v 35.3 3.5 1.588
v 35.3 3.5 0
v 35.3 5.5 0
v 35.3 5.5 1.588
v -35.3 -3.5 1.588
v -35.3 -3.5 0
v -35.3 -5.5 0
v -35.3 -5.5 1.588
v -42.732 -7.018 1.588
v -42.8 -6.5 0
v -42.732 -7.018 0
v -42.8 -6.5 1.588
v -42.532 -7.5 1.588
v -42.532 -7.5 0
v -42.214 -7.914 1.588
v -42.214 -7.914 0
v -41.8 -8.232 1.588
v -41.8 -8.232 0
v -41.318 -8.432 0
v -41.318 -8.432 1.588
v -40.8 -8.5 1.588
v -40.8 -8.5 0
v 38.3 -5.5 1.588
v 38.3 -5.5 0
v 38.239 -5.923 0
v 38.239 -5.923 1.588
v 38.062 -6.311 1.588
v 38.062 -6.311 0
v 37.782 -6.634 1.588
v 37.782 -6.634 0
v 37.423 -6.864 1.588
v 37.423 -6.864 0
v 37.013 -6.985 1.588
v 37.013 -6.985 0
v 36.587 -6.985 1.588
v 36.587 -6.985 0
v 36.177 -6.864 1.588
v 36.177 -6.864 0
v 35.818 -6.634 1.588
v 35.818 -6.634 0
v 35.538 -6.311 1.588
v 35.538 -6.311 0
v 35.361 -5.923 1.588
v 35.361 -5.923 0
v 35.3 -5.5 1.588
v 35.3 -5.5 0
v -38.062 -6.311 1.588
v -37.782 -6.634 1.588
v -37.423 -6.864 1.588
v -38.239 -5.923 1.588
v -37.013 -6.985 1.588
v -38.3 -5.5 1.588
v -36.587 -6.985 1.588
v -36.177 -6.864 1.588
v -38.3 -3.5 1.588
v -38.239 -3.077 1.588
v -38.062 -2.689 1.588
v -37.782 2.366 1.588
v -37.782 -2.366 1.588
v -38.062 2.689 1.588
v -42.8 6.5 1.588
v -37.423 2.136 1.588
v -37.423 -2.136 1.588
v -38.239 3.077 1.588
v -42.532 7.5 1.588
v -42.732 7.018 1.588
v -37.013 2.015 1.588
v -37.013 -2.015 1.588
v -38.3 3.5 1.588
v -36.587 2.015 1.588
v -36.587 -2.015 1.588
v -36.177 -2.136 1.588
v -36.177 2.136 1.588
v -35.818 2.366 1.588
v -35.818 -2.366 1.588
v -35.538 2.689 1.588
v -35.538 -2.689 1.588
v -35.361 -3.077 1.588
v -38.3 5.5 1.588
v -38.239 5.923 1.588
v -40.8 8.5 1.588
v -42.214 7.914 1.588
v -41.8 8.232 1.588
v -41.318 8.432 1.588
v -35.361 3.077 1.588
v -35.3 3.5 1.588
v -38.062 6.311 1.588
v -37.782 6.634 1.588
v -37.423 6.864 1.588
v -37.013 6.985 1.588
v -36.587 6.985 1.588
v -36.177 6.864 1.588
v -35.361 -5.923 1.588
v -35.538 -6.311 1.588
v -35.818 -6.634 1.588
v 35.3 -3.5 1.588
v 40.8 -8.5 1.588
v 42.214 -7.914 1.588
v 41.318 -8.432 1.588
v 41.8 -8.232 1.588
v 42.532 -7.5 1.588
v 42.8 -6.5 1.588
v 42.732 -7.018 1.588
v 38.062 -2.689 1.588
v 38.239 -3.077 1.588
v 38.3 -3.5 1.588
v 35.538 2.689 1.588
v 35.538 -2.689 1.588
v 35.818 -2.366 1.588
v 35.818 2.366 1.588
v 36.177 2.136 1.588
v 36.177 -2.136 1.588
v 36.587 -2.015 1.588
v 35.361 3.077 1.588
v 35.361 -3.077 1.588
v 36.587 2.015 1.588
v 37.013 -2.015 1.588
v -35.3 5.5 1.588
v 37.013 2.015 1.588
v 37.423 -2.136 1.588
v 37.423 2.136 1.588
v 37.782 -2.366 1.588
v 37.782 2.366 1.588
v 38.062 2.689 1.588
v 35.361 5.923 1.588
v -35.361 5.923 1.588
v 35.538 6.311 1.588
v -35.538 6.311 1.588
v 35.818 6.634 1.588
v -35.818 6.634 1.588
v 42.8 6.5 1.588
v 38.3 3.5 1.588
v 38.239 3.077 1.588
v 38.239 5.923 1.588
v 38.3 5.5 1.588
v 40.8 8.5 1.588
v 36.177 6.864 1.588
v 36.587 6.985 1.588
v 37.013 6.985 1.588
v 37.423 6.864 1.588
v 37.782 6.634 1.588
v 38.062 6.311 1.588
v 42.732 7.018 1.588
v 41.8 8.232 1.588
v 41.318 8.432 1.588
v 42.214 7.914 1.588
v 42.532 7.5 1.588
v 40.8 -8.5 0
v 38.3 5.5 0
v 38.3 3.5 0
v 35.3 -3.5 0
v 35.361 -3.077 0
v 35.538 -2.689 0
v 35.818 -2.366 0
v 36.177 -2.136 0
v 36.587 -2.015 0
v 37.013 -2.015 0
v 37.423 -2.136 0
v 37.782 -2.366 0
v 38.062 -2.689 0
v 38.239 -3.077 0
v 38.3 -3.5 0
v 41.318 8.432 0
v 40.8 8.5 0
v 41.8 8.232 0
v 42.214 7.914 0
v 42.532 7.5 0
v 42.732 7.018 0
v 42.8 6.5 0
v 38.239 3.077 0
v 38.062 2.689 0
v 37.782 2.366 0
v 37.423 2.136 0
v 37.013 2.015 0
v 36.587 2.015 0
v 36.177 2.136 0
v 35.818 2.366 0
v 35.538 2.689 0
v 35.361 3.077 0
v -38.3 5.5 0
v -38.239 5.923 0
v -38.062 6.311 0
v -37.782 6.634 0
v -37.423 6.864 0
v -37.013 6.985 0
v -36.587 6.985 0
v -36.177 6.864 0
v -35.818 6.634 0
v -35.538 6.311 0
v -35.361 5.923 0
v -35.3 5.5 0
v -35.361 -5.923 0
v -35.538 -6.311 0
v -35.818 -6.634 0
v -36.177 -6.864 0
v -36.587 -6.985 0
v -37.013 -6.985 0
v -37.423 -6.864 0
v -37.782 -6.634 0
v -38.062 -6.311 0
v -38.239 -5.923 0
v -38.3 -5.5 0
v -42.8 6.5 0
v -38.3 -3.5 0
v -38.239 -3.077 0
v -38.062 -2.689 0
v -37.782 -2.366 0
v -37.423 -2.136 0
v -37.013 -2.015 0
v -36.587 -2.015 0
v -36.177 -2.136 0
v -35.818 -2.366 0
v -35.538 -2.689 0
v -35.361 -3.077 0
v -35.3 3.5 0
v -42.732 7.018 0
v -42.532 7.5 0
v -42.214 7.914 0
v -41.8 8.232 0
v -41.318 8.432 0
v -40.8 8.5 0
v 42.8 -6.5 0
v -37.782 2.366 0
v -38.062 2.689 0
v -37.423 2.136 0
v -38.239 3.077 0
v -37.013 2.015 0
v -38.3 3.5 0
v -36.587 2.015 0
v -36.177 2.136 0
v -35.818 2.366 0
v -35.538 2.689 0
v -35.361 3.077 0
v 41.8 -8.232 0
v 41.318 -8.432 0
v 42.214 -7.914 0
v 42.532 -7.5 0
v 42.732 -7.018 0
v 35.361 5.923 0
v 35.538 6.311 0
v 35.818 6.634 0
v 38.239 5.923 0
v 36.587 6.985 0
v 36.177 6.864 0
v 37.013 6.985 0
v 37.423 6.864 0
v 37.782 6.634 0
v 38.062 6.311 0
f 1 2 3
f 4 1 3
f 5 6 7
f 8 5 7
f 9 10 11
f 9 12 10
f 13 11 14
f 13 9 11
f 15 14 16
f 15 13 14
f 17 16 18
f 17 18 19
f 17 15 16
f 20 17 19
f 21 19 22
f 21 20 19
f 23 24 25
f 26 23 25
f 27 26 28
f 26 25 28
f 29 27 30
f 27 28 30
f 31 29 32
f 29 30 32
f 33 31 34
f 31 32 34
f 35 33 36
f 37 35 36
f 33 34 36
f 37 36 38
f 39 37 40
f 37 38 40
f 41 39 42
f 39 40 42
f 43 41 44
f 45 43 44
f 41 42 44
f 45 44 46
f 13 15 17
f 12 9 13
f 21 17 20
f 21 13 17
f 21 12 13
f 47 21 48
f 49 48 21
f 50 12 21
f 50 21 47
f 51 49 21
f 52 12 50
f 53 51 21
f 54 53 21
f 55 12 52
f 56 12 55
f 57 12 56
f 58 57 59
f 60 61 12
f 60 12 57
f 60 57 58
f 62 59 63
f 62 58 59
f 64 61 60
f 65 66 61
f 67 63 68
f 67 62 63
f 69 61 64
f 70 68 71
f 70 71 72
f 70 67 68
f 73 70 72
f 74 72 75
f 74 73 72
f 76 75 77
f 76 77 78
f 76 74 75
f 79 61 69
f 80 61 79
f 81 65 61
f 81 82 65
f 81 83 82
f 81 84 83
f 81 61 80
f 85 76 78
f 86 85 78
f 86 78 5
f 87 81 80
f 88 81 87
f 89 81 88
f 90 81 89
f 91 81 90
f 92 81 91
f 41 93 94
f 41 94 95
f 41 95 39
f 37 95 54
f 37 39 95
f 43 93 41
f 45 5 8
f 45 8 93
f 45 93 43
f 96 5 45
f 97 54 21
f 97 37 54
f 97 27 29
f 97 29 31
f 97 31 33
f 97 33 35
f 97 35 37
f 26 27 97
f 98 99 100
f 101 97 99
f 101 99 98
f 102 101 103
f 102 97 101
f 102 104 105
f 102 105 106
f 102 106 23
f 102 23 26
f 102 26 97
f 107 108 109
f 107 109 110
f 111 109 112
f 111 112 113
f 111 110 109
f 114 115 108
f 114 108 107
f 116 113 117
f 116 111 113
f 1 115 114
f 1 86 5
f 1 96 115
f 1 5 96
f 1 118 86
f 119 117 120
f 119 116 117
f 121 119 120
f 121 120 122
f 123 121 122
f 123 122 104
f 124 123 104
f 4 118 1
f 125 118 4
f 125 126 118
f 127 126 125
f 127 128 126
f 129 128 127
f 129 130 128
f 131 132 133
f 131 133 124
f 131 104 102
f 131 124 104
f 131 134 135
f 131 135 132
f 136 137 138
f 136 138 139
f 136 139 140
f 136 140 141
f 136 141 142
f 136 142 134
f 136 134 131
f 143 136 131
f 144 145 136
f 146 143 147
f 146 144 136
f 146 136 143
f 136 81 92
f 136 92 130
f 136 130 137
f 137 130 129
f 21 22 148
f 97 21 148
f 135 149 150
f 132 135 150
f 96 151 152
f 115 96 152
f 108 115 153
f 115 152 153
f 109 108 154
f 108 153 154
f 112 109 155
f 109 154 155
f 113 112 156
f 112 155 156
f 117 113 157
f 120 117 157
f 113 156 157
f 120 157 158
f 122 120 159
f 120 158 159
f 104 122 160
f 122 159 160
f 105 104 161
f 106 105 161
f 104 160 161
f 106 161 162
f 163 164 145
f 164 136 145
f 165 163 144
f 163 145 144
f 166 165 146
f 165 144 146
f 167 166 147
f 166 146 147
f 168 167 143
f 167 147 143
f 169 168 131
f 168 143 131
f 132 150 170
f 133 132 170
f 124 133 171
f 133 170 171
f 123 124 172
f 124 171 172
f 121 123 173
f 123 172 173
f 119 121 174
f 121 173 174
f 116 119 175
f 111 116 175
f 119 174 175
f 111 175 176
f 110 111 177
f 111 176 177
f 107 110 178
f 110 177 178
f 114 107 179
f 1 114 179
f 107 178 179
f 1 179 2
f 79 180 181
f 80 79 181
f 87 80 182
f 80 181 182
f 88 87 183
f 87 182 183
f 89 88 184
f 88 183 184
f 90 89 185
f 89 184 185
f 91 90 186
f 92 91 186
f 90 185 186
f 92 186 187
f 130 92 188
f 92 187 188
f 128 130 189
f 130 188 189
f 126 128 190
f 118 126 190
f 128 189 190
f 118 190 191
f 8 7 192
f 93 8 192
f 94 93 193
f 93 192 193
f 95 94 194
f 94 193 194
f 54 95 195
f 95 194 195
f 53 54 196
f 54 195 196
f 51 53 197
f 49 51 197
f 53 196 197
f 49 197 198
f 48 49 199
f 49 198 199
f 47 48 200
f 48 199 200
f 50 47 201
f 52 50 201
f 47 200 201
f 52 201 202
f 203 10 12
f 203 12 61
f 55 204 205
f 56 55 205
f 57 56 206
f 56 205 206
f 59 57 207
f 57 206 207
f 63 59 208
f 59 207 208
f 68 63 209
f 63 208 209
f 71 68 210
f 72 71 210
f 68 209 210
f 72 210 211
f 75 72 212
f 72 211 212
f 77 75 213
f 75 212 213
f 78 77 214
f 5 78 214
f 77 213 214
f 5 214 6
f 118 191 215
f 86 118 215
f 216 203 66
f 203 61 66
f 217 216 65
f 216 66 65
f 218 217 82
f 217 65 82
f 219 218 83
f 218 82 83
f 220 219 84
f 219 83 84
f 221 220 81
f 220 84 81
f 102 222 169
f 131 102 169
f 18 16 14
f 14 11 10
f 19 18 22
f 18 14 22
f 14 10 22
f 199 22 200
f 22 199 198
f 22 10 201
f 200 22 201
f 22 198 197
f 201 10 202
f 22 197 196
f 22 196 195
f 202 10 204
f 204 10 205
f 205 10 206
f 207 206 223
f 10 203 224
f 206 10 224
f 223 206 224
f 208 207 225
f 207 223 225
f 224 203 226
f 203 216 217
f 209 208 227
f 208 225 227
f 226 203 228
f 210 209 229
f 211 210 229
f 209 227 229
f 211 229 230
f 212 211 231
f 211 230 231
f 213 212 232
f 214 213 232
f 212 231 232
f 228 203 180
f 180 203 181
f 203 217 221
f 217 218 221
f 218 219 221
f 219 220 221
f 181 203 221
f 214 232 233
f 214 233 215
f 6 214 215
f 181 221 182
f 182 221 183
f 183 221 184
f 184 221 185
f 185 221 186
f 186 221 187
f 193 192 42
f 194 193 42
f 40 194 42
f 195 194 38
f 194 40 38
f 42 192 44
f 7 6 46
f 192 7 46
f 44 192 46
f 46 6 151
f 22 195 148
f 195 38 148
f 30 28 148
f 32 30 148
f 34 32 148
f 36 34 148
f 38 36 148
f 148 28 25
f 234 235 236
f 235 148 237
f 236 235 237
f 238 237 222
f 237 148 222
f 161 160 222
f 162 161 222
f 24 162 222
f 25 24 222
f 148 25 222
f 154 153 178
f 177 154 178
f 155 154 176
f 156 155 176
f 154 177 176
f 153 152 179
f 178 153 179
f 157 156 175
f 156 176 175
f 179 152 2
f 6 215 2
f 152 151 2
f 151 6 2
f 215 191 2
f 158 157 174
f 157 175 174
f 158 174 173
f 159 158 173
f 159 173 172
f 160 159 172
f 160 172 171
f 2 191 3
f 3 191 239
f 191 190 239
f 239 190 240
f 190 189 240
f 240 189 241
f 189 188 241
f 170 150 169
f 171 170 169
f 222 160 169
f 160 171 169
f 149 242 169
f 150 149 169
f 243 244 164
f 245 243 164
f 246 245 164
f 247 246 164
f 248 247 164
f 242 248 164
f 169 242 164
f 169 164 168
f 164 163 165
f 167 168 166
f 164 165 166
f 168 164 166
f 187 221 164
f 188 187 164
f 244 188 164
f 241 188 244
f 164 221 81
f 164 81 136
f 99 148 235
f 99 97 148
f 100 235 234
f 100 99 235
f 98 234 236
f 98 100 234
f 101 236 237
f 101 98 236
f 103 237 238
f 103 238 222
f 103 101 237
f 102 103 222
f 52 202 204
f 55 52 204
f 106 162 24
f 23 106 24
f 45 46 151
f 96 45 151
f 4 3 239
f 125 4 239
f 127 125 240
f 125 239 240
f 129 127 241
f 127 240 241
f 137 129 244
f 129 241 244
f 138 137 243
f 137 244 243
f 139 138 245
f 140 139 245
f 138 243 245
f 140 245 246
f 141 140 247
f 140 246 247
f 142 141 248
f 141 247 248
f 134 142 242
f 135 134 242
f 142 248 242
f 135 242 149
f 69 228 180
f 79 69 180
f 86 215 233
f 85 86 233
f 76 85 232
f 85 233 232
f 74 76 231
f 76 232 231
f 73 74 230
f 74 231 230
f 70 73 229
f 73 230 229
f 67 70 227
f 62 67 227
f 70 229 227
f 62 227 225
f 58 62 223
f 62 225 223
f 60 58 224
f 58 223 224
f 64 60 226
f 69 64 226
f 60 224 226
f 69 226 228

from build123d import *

# Parameters (mm, degrees)
F0_W     = 85.6
F0_H     = 17
F1_DEPTH = 1.5875
F2_R     = 2


# Not quite as in the source:
# - a length typed as a fraction of an inch, garbled in the dataset ("3 / 203.2 mm" for 3/8 in), is restored


with BuildPart() as f1:
    # F0 (on Top) → F1 (new body)
    with BuildSketch(Plane.XY):
        Rectangle(F0_W, F0_H)
        with BuildLine():
            ThreePointArc((-35.3, -5.5), (-36.8, -7), (-38.3, -5.5))
            Line((-38.3, -5.5), (-38.3, -3.5))
            ThreePointArc((-38.3, -3.5), (-36.8, -2), (-35.3, -3.5))
            Line((-35.3, -3.5), (-35.3, -5.5))
        make_face(mode=Mode.SUBTRACT)
        with BuildLine():
            ThreePointArc((35.3, -3.5), (36.8, -2), (38.3, -3.5))
            Line((38.3, -3.5), (38.3, -5.5))
            ThreePointArc((38.3, -5.5), (36.8, -7), (35.3, -5.5))
            Line((35.3, -5.5), (35.3, -3.5))
        make_face(mode=Mode.SUBTRACT)
        with BuildLine():
            ThreePointArc((-38.3, 5.5), (-36.8, 7), (-35.3, 5.5))
            Line((-35.3, 5.5), (-35.3, 3.5))
            ThreePointArc((-35.3, 3.5), (-36.8, 2), (-38.3, 3.5))
            Line((-38.3, 3.5), (-38.3, 5.5))
        make_face(mode=Mode.SUBTRACT)
        with BuildLine():
            Line((35.3, 3.5), (35.3, 5.5))
            ThreePointArc((35.3, 5.5), (36.8, 7), (38.3, 5.5))
            Line((38.3, 5.5), (38.3, 3.5))
            ThreePointArc((38.3, 3.5), (36.8, 2), (35.3, 3.5))
        make_face(mode=Mode.SUBTRACT)
    extrude(amount=F1_DEPTH)

    # F2
    f2_edges = [f1.edges().sort_by_distance(p)[0] for p in [
        (-42.8, -8.5, 0.79375),
        (-42.8, 8.5, 0.79375),
        (42.8, 8.5, 0.79375),
        (42.8, -8.5, 0.79375),
    ]]
    fillet(f2_edges, radius=F2_R)


solid = f1.part
